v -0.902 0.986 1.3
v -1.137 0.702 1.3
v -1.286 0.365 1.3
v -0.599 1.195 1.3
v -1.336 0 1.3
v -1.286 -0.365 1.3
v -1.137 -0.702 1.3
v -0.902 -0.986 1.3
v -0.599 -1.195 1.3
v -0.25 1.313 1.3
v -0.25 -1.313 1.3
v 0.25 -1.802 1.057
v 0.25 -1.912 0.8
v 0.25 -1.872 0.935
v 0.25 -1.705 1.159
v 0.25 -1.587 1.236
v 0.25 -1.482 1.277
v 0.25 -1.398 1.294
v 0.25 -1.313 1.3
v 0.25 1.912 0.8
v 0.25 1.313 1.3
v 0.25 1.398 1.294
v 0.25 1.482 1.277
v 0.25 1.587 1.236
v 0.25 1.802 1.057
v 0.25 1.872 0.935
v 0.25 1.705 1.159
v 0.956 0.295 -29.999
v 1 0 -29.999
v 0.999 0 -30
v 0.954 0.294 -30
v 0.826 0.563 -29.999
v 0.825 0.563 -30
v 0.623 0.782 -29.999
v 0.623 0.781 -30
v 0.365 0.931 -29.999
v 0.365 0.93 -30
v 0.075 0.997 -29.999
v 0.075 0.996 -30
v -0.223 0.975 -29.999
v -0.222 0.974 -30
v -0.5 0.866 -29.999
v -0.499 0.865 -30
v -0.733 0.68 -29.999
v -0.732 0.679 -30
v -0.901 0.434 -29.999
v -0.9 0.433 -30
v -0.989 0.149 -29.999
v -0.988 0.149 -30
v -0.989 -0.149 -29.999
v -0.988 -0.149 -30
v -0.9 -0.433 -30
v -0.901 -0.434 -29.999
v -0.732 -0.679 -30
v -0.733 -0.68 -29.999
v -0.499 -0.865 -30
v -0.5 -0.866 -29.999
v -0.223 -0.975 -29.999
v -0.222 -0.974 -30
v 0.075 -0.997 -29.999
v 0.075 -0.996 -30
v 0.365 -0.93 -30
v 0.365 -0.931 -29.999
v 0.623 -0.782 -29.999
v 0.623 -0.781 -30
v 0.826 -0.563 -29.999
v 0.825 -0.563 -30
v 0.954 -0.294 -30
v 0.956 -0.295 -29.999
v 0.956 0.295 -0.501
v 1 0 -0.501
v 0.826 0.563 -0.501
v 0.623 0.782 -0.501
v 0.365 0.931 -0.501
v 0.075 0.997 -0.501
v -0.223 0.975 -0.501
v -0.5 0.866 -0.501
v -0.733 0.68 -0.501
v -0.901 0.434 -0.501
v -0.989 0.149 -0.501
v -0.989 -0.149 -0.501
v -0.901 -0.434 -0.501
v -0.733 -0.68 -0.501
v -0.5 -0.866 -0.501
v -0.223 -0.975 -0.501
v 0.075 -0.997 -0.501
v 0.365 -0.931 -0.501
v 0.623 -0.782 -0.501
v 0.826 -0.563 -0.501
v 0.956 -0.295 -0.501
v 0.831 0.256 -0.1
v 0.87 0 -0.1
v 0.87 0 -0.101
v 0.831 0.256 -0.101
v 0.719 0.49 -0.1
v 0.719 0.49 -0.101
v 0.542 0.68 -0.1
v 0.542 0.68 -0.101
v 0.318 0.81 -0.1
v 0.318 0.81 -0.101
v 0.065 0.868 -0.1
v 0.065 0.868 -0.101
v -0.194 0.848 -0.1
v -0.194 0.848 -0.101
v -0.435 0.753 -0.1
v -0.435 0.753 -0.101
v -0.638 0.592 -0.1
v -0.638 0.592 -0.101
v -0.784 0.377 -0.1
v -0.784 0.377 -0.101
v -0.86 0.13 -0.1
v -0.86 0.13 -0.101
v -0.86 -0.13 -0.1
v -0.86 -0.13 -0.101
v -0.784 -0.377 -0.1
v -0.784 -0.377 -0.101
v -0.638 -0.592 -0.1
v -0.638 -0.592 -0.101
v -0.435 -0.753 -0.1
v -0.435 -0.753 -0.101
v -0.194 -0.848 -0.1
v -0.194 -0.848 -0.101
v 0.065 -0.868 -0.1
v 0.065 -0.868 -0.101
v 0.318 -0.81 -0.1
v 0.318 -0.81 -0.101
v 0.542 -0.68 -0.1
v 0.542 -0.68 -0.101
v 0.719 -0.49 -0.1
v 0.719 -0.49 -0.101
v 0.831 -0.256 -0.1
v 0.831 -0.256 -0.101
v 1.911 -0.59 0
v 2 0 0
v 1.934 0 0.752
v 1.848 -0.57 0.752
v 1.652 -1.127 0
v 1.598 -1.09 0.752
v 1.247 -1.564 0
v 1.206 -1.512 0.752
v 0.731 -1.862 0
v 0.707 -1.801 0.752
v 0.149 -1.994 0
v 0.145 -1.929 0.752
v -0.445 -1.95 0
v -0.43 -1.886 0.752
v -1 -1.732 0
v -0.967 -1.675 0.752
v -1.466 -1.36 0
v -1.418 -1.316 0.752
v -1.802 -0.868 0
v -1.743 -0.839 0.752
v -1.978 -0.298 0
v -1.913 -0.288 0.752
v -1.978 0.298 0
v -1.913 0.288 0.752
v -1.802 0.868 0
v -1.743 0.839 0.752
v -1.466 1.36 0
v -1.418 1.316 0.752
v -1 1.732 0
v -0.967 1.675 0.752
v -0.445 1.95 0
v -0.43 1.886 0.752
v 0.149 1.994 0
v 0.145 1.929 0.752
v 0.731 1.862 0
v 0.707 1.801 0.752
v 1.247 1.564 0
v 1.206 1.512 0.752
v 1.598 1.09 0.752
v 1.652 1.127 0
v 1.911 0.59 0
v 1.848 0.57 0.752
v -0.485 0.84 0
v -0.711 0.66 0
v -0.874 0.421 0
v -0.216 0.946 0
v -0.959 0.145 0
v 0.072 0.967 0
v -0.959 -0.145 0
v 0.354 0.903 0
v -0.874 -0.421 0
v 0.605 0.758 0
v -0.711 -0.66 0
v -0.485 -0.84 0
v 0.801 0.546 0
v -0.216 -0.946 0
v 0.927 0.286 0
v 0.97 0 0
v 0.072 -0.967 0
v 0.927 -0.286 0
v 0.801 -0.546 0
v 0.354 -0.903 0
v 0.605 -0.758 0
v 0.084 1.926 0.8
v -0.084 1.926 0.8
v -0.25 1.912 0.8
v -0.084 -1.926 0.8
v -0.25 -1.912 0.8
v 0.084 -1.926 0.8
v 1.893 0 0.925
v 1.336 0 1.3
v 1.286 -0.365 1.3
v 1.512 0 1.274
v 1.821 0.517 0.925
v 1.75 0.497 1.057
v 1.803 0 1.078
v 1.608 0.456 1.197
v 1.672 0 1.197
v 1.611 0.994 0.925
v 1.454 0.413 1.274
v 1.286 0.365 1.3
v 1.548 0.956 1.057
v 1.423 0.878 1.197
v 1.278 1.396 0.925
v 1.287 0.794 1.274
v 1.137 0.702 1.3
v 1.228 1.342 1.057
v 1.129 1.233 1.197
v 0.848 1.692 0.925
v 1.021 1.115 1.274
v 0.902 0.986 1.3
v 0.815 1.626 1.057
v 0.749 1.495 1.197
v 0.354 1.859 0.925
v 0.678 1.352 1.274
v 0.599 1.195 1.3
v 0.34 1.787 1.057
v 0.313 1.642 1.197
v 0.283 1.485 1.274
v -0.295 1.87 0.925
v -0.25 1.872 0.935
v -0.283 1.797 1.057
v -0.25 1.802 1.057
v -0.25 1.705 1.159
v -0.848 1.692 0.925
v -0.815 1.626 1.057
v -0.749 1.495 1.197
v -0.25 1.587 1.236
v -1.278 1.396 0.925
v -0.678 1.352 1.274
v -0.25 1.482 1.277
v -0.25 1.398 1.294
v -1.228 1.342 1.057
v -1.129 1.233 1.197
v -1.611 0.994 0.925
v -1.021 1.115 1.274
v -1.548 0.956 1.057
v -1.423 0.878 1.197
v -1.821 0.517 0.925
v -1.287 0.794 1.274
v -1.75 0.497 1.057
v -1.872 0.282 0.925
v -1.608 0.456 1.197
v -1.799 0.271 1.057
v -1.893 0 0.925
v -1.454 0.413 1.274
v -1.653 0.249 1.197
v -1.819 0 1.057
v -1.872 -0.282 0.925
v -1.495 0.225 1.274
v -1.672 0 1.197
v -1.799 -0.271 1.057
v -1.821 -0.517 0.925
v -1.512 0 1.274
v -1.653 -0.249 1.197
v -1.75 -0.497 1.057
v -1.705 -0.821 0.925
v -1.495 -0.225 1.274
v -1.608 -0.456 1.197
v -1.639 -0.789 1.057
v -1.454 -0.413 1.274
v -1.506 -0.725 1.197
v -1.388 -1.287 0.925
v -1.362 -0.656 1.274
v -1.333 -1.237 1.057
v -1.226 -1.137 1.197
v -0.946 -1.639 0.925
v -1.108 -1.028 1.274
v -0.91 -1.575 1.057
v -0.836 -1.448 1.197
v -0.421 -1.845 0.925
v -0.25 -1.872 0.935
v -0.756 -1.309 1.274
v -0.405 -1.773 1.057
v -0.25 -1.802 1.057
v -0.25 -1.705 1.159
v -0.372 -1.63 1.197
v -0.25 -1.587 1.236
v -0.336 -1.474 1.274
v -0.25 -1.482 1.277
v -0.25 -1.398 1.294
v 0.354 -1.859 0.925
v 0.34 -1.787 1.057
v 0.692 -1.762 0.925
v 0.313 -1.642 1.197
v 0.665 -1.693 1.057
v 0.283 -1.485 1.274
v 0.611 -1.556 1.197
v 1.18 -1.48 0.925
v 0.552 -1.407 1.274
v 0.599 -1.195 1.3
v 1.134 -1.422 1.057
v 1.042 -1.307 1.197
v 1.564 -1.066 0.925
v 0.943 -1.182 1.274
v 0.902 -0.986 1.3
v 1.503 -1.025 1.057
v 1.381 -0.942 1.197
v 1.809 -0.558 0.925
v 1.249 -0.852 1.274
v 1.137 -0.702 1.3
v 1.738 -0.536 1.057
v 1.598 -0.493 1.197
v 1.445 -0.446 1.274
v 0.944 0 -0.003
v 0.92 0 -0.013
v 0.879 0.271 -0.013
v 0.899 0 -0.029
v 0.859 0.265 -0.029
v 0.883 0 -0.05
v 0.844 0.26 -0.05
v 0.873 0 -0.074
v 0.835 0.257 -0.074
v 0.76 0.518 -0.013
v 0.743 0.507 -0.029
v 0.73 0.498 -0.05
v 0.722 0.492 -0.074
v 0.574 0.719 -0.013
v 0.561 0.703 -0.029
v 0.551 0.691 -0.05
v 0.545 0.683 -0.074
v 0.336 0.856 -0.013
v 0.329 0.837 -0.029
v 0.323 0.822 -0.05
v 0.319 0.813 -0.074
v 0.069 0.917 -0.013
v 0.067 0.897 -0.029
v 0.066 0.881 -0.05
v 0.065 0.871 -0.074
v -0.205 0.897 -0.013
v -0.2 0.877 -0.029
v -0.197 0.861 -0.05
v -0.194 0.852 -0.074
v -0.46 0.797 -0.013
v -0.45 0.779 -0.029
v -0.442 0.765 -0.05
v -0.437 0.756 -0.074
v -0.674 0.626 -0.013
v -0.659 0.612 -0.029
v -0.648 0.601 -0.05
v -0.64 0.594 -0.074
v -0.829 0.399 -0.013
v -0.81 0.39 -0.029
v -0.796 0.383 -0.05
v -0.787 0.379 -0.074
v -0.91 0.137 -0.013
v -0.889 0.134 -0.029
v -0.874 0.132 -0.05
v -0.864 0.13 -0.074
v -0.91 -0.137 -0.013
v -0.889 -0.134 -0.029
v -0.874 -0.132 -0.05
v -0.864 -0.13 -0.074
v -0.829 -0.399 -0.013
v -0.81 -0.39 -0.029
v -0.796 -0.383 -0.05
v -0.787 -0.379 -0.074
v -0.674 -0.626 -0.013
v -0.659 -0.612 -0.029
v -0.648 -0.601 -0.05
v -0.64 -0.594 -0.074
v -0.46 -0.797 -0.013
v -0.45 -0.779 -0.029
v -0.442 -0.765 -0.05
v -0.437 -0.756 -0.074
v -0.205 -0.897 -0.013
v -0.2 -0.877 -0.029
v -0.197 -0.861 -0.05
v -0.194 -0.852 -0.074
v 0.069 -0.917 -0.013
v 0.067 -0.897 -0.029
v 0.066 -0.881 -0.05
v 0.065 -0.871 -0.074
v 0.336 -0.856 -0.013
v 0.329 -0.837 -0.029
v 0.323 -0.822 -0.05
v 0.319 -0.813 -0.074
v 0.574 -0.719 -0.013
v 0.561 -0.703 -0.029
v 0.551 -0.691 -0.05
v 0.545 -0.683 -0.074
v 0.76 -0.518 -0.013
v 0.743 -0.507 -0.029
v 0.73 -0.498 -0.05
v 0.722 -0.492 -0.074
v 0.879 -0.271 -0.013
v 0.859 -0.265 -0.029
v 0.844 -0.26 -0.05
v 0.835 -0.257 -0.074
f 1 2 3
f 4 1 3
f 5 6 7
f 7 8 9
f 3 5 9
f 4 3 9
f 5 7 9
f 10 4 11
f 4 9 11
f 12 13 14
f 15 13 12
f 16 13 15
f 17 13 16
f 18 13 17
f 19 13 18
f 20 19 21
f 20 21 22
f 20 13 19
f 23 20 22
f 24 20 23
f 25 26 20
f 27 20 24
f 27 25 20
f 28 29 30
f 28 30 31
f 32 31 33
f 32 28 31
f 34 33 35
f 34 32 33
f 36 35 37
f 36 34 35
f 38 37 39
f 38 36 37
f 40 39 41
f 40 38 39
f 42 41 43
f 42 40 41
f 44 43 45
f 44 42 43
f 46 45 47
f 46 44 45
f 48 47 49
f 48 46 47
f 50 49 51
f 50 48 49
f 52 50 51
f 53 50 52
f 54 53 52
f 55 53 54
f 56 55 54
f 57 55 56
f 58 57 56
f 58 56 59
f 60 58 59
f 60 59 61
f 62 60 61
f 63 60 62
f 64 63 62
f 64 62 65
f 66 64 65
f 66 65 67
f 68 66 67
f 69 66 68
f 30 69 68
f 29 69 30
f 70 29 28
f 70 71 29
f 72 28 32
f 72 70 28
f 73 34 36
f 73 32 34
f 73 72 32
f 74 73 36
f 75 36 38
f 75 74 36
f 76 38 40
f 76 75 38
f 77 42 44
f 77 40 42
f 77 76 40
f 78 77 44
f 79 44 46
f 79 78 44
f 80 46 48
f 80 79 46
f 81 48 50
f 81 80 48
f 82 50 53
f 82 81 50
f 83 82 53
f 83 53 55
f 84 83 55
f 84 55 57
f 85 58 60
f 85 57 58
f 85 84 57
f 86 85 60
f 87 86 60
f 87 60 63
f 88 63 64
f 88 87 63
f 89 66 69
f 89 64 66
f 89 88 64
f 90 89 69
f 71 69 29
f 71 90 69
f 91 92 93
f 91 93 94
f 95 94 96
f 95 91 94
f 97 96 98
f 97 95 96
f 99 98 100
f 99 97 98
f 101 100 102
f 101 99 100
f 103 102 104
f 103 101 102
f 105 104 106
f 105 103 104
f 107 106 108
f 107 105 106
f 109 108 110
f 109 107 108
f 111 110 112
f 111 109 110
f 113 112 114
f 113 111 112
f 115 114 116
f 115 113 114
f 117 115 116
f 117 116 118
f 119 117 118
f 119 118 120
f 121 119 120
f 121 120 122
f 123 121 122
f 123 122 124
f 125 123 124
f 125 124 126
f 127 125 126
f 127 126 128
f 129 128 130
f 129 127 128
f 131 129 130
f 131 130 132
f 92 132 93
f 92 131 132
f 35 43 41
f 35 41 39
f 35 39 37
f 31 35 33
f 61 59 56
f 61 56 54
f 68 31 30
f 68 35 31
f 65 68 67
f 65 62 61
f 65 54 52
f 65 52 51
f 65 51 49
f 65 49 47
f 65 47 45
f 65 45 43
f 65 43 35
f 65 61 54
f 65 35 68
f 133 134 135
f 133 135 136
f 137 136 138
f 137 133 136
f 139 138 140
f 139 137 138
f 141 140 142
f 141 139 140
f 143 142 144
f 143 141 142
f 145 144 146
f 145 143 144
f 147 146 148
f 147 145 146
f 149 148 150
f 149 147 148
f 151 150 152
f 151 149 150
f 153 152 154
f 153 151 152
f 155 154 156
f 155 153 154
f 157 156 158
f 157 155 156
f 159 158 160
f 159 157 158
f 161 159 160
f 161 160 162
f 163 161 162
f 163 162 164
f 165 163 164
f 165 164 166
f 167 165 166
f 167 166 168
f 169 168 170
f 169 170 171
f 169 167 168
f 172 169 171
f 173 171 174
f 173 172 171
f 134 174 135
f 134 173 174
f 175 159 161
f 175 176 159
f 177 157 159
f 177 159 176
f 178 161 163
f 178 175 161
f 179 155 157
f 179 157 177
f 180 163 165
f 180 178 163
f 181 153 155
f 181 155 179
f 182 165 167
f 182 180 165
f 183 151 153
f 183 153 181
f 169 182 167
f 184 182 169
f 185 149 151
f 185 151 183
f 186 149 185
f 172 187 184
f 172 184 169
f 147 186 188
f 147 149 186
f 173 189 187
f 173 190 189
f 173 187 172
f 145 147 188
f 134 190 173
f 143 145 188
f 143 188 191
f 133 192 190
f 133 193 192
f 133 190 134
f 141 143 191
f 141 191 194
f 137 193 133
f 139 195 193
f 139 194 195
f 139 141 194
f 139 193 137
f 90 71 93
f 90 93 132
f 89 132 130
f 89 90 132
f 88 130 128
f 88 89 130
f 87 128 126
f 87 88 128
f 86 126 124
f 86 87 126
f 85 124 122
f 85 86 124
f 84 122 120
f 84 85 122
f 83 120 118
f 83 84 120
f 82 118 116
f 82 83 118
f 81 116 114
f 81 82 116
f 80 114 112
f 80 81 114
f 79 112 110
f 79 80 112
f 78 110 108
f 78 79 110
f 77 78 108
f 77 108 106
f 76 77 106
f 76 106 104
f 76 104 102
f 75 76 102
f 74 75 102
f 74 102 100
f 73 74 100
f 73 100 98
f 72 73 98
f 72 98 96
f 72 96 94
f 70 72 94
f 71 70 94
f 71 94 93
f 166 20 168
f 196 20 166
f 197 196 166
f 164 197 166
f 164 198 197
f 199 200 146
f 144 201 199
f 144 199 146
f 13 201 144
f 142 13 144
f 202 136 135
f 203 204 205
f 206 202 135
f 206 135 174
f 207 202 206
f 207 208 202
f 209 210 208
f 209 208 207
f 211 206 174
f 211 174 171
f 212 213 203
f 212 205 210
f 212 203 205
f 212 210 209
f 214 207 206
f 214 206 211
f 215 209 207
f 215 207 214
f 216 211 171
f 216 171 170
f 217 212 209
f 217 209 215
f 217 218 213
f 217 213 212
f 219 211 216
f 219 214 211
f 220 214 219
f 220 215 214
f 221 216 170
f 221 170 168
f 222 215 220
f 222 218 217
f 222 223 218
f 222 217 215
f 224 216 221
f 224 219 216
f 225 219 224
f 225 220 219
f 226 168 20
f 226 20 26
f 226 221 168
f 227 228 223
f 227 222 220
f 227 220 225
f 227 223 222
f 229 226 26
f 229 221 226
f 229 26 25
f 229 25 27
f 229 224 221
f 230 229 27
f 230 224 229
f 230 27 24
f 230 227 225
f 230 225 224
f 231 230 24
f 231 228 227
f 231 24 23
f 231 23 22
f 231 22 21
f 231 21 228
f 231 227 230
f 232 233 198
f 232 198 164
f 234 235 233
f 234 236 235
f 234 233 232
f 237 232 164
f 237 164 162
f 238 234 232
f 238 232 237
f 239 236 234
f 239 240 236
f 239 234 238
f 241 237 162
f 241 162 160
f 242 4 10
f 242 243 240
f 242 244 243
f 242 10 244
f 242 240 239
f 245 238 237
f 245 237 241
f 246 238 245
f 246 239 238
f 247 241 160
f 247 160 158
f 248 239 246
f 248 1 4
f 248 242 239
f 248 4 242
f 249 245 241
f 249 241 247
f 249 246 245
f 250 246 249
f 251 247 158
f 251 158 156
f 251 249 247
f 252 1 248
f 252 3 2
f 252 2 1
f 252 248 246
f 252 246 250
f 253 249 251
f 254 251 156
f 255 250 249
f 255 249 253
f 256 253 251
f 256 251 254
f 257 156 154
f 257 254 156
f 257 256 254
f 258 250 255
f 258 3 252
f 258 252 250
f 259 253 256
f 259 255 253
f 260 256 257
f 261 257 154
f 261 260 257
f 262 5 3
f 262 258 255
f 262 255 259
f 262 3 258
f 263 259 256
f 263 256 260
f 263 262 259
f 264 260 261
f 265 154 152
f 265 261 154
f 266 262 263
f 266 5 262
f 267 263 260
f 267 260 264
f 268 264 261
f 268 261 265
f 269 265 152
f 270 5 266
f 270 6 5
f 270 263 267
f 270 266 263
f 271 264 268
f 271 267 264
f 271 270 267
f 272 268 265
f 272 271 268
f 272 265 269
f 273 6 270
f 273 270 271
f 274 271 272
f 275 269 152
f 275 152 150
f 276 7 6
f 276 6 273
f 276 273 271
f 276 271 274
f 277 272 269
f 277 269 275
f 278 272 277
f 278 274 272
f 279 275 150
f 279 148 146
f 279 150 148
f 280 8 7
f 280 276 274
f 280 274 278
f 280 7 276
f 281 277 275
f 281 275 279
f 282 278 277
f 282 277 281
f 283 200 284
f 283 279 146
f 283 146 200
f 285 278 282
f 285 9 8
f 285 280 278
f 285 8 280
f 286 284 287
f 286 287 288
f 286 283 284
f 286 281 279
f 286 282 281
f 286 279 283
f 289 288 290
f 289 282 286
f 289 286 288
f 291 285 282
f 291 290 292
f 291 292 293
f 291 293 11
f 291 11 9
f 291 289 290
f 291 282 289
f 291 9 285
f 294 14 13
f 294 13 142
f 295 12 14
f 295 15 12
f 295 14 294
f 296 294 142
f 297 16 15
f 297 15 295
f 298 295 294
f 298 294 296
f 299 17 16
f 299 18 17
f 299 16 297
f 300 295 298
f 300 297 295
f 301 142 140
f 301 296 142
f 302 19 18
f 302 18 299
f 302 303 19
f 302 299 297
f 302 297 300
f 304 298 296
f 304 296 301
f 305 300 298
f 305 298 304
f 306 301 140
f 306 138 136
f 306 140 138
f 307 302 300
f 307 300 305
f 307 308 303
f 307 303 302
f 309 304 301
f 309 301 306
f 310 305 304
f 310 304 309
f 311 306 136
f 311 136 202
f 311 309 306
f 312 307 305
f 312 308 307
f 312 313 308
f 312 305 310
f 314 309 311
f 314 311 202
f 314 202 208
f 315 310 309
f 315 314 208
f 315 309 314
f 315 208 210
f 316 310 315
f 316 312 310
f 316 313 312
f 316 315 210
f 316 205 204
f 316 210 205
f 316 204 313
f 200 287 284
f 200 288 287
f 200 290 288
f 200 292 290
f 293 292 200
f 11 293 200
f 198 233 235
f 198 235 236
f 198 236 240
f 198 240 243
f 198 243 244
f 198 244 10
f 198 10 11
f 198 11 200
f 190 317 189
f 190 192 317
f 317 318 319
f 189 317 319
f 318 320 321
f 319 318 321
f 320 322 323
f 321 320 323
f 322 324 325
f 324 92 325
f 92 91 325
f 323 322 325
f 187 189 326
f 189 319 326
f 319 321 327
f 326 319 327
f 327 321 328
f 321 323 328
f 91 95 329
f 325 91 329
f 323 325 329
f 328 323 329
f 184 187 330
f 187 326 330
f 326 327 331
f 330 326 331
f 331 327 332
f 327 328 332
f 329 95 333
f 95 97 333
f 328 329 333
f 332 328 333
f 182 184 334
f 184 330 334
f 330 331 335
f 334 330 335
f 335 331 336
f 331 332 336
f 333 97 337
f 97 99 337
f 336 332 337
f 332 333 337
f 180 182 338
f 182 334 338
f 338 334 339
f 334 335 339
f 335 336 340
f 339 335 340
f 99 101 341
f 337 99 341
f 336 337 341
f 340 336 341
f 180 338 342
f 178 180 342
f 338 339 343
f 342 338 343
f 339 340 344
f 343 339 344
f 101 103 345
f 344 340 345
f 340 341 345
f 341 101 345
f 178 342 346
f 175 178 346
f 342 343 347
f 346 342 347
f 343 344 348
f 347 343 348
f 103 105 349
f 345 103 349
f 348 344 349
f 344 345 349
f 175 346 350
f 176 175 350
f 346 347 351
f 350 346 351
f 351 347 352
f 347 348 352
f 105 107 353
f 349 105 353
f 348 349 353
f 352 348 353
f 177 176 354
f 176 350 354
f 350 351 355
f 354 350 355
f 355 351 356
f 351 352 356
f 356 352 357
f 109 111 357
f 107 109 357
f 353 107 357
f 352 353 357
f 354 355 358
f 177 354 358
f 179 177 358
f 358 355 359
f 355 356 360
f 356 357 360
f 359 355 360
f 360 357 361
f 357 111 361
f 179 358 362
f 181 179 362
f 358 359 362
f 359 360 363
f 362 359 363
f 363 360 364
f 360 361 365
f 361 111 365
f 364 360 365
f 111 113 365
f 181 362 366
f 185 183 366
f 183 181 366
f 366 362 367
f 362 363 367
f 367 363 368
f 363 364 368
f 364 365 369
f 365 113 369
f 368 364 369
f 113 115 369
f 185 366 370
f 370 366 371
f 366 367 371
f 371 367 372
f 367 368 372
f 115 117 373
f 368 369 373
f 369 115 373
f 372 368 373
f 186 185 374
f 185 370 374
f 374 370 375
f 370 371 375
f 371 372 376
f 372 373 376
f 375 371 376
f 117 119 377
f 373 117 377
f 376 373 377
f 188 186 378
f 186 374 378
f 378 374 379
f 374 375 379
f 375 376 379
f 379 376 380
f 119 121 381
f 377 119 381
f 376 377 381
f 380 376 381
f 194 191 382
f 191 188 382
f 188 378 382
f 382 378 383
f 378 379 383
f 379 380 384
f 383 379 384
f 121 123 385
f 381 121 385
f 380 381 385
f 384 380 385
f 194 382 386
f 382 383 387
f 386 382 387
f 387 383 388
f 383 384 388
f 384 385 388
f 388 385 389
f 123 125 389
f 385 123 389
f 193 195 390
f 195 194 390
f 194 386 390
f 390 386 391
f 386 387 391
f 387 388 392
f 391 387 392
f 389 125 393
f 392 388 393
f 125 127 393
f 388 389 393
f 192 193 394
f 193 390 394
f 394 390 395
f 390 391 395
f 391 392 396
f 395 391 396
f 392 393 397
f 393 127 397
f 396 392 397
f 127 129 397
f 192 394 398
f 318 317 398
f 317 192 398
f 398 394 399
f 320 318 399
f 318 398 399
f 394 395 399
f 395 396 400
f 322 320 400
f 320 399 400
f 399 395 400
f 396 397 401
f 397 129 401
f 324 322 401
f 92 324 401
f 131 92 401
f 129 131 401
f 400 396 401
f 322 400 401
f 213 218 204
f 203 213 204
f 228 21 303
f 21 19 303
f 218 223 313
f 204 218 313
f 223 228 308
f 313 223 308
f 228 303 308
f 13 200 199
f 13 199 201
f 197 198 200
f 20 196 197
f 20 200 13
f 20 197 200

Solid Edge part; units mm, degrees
sketch "Sketch1" plane through (0, 0, 0) normal (0, -1, 0) x (1, 0, 0)
  line L0 (0, -30) -> (1, -30)
  line L1 (1, -30) -> (1, -0.501)
  line L2 (1, -0.501) -> (0.87, -0.101)
  line L3 (0.87, -0.101) -> (0.87, 0)
  line L4 (0.87, 0) -> (2, 0)
  line L5 (2, 0) -> (1.8863, 1.3)
  line L6 (1.8863, 1.3) -> (0, 1.3)
  dimension "D1" = 1
  dimension "D2" = 0.87
  dimension "D3" = 30
  dimension "D4" = 29.499
  dimension "D5" = 0.4
  dimension "D6" = 2
  dimension "D7" = 1.3
revolve "RevolvedProtrusion1" add sketch "Sketch1" angle 360 about axis through (0, 0, 6) along (0, 0, -1)
fillet "Round_1" radius 0.6 1 edges at (-1.8863, 0, 1.3)
sketch "Sketch2" plane through (0, 0, 0) normal (0, -1, 0) x (1, 0, 0)
  line L0 (-0.25, 1.3) -> (-0.25, 0.8)
  line L1 (-0.25, 0.8) -> (0.25, 0.8)
  line L2 (0.25, 0.8) -> (0.25, 1.3)
  line L3 (0.25, 1.3) -> (-0.25, 1.3)
  dimension "D1" = 0.5
  dimension "D2" = 0.5
  dimension "D3" = 1.3
extrude "ExtrudedCutout_1" cut sketch "Sketch2" along normal mid plane 4
cosmetic_thread "Thread_1" size "M2" thread depth 29.499
fillet "Round_2" radius 0.1 1 edges at (-0.87, 0, 0)
chamfer "Chamfer_1" distance 0.0012 angle 30 1 edges at (-1, 0, -30) measured on face at (0.6867, 0.6467, -30)
properties material "Steel"
